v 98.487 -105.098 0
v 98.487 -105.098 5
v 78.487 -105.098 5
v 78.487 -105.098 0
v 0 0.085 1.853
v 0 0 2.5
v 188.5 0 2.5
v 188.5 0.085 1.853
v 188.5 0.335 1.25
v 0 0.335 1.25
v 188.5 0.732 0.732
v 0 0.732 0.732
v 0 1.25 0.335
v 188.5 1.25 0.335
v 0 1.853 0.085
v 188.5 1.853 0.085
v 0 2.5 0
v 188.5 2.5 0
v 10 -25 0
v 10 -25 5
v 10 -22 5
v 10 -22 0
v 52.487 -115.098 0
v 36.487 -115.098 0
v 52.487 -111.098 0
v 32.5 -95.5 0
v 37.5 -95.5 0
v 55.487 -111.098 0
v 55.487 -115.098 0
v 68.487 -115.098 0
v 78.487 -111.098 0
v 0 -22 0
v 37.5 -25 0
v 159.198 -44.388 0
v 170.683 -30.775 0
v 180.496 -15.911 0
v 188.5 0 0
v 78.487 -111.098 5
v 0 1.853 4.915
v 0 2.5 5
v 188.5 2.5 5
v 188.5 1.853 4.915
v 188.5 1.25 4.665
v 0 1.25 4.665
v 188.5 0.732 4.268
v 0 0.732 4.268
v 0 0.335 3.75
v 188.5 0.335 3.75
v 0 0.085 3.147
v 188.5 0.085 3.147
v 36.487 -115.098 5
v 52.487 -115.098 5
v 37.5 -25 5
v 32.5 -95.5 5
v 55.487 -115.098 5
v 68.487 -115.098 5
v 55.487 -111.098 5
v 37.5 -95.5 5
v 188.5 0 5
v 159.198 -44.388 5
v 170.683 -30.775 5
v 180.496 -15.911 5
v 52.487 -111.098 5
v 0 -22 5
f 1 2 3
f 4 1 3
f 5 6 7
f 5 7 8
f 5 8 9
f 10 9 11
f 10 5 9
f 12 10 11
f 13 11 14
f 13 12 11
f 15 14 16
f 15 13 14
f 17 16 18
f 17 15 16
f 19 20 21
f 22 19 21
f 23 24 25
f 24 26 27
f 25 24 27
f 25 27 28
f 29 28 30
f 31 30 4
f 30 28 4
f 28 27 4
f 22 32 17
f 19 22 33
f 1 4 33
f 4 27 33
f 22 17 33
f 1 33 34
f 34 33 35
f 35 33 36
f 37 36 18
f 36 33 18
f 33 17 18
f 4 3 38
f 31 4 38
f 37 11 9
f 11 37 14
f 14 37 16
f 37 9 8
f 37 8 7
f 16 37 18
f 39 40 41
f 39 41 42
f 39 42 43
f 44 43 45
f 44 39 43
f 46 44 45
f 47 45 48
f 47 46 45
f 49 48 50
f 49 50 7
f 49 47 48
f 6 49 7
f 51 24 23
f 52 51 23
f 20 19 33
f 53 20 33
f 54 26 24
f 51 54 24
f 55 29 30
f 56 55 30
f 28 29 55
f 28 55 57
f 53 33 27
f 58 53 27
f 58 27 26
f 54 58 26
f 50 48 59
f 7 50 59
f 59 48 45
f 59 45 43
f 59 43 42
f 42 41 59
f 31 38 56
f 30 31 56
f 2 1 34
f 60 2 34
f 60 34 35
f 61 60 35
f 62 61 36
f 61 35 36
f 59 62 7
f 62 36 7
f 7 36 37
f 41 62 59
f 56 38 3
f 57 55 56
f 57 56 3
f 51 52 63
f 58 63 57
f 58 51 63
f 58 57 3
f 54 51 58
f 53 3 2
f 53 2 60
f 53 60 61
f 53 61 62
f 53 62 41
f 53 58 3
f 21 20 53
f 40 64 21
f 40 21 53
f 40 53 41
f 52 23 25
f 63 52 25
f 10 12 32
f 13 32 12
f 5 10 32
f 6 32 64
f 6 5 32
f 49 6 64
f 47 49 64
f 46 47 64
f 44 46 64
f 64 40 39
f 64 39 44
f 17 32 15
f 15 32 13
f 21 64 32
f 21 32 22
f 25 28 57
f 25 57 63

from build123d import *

# Parameters (mm, degrees)
BOSS_EXTRU_1_DEPTH      = 5
ESQUISSE3_W             = 10
ESQUISSE3_H             = 3
ENL_V_MAT_EXTRU_1_DEPTH = 231.967242256
ENL_V_MAT_EXTRU_2_DEPTH = 231.967242256
ENL_V_MAT_EXTRU_3_DEPTH = 231.967242256
BOSS_EXTRU_2_DEPTH      = 188.5
ESQUISSE6_W             = 3
ESQUISSE6_H             = 4
ENL_V_MAT_EXTRU_4_DEPTH = 221.918340892


with BuildPart() as part:
    # Esquisse1 → Boss.-Extru.1 (new body)
    with BuildSketch(Plane.XY):
        with BuildLine():
            Line((0, 0), (0, -25))
            Line((0, -25), (37.5, -25))
            Line((37.5, -25), (37.5, -95.5))
            Line((37.5, -95.5), (32.5, -95.5))
            Line((32.5, -95.5), (36.487358688, -115.098494092))
            Line((36.487358688, -115.098494092), (88.487358688, -115.098494092))
            Line((88.487358688, -115.098494092), (159.198036807, -44.387815974))
            ThreePointArc((159.198036807, -44.387815974), (187.146342861, -3.044299659), (200.182925478, 45.126663235))
            Line((200.182925478, 45.126663235), (43.682925478, 43.998857528))
            ThreePointArc((43.682925478, 43.998857528), (12.775400091, 31.000392909), (0, 0))
        make_face()
    extrude(amount=BOSS_EXTRU_1_DEPTH)

    # Esquisse3 → Enlèv. mat.-Extru.1 (cut, through all)
    with BuildSketch(Plane.XY.offset(5)):
        with Locations((5, -23.5)):
            Rectangle(ESQUISSE3_W, ESQUISSE3_H)
    extrude(amount=-ENL_V_MAT_EXTRU_1_DEPTH, mode=Mode.SUBTRACT)

    # Esquisse4 → Enlèv. mat.-Extru.2 (cut, through all)
    with BuildSketch(Plane.XY.offset(5)):
        Polygon((88.487358688, -105.098494092), (78.487358688, -105.098494092), (78.487358688, -111.098494092), (68.487358688, -115.098494092), (78.487358688, -115.098494092), (88.487358688, -115.098494092), (98.487358688, -105.098494092), align=None)
    extrude(amount=-ENL_V_MAT_EXTRU_2_DEPTH, mode=Mode.SUBTRACT)

    # Esquisse2 → Enlèv. mat.-Extru.3 (cut, through all)
    with BuildSketch(Plane.XY.offset(5)):
        Polygon((0, 0), (188.5, 0), (209.362190725, -2.460738477), (219.452028236, 63.380017622), (19.477580028, 66.088918501), (-15.632624315, 12.443515375), align=None)
    extrude(amount=-ENL_V_MAT_EXTRU_3_DEPTH, mode=Mode.SUBTRACT)

    # Esquisse5 → Boss.-Extru.2 (add)
    with BuildSketch(Plane.ZY):
        with BuildLine():
            Line((2.5, 0), (5, 0))
            Line((5, 0), (5, 2.5))
            ThreePointArc((5, 2.5), (4.267766953, 0.732233047), (2.5, 0))
        make_face()
        with BuildLine():
            Line((0, 0), (2.5, 0))
            ThreePointArc((2.5, 0), (0.732233047, 0.732233047), (0, 2.5))
            Line((0, 2.5), (0, 0))
        make_face()
    extrude(amount=-BOSS_EXTRU_2_DEPTH)

    # Esquisse6 → Enlèv. mat.-Extru.4 (cut, through all)
    with BuildSketch(Plane(origin=(0, 0, 0), x_dir=(-1, 0, 0), z_dir=(0, 0, -1))):
        with Locations((-53.987358688, -113.098494092)):
            Rectangle(ESQUISSE6_W, ESQUISSE6_H)
    extrude(amount=-ENL_V_MAT_EXTRU_4_DEPTH, mode=Mode.SUBTRACT)


solid = part.part
